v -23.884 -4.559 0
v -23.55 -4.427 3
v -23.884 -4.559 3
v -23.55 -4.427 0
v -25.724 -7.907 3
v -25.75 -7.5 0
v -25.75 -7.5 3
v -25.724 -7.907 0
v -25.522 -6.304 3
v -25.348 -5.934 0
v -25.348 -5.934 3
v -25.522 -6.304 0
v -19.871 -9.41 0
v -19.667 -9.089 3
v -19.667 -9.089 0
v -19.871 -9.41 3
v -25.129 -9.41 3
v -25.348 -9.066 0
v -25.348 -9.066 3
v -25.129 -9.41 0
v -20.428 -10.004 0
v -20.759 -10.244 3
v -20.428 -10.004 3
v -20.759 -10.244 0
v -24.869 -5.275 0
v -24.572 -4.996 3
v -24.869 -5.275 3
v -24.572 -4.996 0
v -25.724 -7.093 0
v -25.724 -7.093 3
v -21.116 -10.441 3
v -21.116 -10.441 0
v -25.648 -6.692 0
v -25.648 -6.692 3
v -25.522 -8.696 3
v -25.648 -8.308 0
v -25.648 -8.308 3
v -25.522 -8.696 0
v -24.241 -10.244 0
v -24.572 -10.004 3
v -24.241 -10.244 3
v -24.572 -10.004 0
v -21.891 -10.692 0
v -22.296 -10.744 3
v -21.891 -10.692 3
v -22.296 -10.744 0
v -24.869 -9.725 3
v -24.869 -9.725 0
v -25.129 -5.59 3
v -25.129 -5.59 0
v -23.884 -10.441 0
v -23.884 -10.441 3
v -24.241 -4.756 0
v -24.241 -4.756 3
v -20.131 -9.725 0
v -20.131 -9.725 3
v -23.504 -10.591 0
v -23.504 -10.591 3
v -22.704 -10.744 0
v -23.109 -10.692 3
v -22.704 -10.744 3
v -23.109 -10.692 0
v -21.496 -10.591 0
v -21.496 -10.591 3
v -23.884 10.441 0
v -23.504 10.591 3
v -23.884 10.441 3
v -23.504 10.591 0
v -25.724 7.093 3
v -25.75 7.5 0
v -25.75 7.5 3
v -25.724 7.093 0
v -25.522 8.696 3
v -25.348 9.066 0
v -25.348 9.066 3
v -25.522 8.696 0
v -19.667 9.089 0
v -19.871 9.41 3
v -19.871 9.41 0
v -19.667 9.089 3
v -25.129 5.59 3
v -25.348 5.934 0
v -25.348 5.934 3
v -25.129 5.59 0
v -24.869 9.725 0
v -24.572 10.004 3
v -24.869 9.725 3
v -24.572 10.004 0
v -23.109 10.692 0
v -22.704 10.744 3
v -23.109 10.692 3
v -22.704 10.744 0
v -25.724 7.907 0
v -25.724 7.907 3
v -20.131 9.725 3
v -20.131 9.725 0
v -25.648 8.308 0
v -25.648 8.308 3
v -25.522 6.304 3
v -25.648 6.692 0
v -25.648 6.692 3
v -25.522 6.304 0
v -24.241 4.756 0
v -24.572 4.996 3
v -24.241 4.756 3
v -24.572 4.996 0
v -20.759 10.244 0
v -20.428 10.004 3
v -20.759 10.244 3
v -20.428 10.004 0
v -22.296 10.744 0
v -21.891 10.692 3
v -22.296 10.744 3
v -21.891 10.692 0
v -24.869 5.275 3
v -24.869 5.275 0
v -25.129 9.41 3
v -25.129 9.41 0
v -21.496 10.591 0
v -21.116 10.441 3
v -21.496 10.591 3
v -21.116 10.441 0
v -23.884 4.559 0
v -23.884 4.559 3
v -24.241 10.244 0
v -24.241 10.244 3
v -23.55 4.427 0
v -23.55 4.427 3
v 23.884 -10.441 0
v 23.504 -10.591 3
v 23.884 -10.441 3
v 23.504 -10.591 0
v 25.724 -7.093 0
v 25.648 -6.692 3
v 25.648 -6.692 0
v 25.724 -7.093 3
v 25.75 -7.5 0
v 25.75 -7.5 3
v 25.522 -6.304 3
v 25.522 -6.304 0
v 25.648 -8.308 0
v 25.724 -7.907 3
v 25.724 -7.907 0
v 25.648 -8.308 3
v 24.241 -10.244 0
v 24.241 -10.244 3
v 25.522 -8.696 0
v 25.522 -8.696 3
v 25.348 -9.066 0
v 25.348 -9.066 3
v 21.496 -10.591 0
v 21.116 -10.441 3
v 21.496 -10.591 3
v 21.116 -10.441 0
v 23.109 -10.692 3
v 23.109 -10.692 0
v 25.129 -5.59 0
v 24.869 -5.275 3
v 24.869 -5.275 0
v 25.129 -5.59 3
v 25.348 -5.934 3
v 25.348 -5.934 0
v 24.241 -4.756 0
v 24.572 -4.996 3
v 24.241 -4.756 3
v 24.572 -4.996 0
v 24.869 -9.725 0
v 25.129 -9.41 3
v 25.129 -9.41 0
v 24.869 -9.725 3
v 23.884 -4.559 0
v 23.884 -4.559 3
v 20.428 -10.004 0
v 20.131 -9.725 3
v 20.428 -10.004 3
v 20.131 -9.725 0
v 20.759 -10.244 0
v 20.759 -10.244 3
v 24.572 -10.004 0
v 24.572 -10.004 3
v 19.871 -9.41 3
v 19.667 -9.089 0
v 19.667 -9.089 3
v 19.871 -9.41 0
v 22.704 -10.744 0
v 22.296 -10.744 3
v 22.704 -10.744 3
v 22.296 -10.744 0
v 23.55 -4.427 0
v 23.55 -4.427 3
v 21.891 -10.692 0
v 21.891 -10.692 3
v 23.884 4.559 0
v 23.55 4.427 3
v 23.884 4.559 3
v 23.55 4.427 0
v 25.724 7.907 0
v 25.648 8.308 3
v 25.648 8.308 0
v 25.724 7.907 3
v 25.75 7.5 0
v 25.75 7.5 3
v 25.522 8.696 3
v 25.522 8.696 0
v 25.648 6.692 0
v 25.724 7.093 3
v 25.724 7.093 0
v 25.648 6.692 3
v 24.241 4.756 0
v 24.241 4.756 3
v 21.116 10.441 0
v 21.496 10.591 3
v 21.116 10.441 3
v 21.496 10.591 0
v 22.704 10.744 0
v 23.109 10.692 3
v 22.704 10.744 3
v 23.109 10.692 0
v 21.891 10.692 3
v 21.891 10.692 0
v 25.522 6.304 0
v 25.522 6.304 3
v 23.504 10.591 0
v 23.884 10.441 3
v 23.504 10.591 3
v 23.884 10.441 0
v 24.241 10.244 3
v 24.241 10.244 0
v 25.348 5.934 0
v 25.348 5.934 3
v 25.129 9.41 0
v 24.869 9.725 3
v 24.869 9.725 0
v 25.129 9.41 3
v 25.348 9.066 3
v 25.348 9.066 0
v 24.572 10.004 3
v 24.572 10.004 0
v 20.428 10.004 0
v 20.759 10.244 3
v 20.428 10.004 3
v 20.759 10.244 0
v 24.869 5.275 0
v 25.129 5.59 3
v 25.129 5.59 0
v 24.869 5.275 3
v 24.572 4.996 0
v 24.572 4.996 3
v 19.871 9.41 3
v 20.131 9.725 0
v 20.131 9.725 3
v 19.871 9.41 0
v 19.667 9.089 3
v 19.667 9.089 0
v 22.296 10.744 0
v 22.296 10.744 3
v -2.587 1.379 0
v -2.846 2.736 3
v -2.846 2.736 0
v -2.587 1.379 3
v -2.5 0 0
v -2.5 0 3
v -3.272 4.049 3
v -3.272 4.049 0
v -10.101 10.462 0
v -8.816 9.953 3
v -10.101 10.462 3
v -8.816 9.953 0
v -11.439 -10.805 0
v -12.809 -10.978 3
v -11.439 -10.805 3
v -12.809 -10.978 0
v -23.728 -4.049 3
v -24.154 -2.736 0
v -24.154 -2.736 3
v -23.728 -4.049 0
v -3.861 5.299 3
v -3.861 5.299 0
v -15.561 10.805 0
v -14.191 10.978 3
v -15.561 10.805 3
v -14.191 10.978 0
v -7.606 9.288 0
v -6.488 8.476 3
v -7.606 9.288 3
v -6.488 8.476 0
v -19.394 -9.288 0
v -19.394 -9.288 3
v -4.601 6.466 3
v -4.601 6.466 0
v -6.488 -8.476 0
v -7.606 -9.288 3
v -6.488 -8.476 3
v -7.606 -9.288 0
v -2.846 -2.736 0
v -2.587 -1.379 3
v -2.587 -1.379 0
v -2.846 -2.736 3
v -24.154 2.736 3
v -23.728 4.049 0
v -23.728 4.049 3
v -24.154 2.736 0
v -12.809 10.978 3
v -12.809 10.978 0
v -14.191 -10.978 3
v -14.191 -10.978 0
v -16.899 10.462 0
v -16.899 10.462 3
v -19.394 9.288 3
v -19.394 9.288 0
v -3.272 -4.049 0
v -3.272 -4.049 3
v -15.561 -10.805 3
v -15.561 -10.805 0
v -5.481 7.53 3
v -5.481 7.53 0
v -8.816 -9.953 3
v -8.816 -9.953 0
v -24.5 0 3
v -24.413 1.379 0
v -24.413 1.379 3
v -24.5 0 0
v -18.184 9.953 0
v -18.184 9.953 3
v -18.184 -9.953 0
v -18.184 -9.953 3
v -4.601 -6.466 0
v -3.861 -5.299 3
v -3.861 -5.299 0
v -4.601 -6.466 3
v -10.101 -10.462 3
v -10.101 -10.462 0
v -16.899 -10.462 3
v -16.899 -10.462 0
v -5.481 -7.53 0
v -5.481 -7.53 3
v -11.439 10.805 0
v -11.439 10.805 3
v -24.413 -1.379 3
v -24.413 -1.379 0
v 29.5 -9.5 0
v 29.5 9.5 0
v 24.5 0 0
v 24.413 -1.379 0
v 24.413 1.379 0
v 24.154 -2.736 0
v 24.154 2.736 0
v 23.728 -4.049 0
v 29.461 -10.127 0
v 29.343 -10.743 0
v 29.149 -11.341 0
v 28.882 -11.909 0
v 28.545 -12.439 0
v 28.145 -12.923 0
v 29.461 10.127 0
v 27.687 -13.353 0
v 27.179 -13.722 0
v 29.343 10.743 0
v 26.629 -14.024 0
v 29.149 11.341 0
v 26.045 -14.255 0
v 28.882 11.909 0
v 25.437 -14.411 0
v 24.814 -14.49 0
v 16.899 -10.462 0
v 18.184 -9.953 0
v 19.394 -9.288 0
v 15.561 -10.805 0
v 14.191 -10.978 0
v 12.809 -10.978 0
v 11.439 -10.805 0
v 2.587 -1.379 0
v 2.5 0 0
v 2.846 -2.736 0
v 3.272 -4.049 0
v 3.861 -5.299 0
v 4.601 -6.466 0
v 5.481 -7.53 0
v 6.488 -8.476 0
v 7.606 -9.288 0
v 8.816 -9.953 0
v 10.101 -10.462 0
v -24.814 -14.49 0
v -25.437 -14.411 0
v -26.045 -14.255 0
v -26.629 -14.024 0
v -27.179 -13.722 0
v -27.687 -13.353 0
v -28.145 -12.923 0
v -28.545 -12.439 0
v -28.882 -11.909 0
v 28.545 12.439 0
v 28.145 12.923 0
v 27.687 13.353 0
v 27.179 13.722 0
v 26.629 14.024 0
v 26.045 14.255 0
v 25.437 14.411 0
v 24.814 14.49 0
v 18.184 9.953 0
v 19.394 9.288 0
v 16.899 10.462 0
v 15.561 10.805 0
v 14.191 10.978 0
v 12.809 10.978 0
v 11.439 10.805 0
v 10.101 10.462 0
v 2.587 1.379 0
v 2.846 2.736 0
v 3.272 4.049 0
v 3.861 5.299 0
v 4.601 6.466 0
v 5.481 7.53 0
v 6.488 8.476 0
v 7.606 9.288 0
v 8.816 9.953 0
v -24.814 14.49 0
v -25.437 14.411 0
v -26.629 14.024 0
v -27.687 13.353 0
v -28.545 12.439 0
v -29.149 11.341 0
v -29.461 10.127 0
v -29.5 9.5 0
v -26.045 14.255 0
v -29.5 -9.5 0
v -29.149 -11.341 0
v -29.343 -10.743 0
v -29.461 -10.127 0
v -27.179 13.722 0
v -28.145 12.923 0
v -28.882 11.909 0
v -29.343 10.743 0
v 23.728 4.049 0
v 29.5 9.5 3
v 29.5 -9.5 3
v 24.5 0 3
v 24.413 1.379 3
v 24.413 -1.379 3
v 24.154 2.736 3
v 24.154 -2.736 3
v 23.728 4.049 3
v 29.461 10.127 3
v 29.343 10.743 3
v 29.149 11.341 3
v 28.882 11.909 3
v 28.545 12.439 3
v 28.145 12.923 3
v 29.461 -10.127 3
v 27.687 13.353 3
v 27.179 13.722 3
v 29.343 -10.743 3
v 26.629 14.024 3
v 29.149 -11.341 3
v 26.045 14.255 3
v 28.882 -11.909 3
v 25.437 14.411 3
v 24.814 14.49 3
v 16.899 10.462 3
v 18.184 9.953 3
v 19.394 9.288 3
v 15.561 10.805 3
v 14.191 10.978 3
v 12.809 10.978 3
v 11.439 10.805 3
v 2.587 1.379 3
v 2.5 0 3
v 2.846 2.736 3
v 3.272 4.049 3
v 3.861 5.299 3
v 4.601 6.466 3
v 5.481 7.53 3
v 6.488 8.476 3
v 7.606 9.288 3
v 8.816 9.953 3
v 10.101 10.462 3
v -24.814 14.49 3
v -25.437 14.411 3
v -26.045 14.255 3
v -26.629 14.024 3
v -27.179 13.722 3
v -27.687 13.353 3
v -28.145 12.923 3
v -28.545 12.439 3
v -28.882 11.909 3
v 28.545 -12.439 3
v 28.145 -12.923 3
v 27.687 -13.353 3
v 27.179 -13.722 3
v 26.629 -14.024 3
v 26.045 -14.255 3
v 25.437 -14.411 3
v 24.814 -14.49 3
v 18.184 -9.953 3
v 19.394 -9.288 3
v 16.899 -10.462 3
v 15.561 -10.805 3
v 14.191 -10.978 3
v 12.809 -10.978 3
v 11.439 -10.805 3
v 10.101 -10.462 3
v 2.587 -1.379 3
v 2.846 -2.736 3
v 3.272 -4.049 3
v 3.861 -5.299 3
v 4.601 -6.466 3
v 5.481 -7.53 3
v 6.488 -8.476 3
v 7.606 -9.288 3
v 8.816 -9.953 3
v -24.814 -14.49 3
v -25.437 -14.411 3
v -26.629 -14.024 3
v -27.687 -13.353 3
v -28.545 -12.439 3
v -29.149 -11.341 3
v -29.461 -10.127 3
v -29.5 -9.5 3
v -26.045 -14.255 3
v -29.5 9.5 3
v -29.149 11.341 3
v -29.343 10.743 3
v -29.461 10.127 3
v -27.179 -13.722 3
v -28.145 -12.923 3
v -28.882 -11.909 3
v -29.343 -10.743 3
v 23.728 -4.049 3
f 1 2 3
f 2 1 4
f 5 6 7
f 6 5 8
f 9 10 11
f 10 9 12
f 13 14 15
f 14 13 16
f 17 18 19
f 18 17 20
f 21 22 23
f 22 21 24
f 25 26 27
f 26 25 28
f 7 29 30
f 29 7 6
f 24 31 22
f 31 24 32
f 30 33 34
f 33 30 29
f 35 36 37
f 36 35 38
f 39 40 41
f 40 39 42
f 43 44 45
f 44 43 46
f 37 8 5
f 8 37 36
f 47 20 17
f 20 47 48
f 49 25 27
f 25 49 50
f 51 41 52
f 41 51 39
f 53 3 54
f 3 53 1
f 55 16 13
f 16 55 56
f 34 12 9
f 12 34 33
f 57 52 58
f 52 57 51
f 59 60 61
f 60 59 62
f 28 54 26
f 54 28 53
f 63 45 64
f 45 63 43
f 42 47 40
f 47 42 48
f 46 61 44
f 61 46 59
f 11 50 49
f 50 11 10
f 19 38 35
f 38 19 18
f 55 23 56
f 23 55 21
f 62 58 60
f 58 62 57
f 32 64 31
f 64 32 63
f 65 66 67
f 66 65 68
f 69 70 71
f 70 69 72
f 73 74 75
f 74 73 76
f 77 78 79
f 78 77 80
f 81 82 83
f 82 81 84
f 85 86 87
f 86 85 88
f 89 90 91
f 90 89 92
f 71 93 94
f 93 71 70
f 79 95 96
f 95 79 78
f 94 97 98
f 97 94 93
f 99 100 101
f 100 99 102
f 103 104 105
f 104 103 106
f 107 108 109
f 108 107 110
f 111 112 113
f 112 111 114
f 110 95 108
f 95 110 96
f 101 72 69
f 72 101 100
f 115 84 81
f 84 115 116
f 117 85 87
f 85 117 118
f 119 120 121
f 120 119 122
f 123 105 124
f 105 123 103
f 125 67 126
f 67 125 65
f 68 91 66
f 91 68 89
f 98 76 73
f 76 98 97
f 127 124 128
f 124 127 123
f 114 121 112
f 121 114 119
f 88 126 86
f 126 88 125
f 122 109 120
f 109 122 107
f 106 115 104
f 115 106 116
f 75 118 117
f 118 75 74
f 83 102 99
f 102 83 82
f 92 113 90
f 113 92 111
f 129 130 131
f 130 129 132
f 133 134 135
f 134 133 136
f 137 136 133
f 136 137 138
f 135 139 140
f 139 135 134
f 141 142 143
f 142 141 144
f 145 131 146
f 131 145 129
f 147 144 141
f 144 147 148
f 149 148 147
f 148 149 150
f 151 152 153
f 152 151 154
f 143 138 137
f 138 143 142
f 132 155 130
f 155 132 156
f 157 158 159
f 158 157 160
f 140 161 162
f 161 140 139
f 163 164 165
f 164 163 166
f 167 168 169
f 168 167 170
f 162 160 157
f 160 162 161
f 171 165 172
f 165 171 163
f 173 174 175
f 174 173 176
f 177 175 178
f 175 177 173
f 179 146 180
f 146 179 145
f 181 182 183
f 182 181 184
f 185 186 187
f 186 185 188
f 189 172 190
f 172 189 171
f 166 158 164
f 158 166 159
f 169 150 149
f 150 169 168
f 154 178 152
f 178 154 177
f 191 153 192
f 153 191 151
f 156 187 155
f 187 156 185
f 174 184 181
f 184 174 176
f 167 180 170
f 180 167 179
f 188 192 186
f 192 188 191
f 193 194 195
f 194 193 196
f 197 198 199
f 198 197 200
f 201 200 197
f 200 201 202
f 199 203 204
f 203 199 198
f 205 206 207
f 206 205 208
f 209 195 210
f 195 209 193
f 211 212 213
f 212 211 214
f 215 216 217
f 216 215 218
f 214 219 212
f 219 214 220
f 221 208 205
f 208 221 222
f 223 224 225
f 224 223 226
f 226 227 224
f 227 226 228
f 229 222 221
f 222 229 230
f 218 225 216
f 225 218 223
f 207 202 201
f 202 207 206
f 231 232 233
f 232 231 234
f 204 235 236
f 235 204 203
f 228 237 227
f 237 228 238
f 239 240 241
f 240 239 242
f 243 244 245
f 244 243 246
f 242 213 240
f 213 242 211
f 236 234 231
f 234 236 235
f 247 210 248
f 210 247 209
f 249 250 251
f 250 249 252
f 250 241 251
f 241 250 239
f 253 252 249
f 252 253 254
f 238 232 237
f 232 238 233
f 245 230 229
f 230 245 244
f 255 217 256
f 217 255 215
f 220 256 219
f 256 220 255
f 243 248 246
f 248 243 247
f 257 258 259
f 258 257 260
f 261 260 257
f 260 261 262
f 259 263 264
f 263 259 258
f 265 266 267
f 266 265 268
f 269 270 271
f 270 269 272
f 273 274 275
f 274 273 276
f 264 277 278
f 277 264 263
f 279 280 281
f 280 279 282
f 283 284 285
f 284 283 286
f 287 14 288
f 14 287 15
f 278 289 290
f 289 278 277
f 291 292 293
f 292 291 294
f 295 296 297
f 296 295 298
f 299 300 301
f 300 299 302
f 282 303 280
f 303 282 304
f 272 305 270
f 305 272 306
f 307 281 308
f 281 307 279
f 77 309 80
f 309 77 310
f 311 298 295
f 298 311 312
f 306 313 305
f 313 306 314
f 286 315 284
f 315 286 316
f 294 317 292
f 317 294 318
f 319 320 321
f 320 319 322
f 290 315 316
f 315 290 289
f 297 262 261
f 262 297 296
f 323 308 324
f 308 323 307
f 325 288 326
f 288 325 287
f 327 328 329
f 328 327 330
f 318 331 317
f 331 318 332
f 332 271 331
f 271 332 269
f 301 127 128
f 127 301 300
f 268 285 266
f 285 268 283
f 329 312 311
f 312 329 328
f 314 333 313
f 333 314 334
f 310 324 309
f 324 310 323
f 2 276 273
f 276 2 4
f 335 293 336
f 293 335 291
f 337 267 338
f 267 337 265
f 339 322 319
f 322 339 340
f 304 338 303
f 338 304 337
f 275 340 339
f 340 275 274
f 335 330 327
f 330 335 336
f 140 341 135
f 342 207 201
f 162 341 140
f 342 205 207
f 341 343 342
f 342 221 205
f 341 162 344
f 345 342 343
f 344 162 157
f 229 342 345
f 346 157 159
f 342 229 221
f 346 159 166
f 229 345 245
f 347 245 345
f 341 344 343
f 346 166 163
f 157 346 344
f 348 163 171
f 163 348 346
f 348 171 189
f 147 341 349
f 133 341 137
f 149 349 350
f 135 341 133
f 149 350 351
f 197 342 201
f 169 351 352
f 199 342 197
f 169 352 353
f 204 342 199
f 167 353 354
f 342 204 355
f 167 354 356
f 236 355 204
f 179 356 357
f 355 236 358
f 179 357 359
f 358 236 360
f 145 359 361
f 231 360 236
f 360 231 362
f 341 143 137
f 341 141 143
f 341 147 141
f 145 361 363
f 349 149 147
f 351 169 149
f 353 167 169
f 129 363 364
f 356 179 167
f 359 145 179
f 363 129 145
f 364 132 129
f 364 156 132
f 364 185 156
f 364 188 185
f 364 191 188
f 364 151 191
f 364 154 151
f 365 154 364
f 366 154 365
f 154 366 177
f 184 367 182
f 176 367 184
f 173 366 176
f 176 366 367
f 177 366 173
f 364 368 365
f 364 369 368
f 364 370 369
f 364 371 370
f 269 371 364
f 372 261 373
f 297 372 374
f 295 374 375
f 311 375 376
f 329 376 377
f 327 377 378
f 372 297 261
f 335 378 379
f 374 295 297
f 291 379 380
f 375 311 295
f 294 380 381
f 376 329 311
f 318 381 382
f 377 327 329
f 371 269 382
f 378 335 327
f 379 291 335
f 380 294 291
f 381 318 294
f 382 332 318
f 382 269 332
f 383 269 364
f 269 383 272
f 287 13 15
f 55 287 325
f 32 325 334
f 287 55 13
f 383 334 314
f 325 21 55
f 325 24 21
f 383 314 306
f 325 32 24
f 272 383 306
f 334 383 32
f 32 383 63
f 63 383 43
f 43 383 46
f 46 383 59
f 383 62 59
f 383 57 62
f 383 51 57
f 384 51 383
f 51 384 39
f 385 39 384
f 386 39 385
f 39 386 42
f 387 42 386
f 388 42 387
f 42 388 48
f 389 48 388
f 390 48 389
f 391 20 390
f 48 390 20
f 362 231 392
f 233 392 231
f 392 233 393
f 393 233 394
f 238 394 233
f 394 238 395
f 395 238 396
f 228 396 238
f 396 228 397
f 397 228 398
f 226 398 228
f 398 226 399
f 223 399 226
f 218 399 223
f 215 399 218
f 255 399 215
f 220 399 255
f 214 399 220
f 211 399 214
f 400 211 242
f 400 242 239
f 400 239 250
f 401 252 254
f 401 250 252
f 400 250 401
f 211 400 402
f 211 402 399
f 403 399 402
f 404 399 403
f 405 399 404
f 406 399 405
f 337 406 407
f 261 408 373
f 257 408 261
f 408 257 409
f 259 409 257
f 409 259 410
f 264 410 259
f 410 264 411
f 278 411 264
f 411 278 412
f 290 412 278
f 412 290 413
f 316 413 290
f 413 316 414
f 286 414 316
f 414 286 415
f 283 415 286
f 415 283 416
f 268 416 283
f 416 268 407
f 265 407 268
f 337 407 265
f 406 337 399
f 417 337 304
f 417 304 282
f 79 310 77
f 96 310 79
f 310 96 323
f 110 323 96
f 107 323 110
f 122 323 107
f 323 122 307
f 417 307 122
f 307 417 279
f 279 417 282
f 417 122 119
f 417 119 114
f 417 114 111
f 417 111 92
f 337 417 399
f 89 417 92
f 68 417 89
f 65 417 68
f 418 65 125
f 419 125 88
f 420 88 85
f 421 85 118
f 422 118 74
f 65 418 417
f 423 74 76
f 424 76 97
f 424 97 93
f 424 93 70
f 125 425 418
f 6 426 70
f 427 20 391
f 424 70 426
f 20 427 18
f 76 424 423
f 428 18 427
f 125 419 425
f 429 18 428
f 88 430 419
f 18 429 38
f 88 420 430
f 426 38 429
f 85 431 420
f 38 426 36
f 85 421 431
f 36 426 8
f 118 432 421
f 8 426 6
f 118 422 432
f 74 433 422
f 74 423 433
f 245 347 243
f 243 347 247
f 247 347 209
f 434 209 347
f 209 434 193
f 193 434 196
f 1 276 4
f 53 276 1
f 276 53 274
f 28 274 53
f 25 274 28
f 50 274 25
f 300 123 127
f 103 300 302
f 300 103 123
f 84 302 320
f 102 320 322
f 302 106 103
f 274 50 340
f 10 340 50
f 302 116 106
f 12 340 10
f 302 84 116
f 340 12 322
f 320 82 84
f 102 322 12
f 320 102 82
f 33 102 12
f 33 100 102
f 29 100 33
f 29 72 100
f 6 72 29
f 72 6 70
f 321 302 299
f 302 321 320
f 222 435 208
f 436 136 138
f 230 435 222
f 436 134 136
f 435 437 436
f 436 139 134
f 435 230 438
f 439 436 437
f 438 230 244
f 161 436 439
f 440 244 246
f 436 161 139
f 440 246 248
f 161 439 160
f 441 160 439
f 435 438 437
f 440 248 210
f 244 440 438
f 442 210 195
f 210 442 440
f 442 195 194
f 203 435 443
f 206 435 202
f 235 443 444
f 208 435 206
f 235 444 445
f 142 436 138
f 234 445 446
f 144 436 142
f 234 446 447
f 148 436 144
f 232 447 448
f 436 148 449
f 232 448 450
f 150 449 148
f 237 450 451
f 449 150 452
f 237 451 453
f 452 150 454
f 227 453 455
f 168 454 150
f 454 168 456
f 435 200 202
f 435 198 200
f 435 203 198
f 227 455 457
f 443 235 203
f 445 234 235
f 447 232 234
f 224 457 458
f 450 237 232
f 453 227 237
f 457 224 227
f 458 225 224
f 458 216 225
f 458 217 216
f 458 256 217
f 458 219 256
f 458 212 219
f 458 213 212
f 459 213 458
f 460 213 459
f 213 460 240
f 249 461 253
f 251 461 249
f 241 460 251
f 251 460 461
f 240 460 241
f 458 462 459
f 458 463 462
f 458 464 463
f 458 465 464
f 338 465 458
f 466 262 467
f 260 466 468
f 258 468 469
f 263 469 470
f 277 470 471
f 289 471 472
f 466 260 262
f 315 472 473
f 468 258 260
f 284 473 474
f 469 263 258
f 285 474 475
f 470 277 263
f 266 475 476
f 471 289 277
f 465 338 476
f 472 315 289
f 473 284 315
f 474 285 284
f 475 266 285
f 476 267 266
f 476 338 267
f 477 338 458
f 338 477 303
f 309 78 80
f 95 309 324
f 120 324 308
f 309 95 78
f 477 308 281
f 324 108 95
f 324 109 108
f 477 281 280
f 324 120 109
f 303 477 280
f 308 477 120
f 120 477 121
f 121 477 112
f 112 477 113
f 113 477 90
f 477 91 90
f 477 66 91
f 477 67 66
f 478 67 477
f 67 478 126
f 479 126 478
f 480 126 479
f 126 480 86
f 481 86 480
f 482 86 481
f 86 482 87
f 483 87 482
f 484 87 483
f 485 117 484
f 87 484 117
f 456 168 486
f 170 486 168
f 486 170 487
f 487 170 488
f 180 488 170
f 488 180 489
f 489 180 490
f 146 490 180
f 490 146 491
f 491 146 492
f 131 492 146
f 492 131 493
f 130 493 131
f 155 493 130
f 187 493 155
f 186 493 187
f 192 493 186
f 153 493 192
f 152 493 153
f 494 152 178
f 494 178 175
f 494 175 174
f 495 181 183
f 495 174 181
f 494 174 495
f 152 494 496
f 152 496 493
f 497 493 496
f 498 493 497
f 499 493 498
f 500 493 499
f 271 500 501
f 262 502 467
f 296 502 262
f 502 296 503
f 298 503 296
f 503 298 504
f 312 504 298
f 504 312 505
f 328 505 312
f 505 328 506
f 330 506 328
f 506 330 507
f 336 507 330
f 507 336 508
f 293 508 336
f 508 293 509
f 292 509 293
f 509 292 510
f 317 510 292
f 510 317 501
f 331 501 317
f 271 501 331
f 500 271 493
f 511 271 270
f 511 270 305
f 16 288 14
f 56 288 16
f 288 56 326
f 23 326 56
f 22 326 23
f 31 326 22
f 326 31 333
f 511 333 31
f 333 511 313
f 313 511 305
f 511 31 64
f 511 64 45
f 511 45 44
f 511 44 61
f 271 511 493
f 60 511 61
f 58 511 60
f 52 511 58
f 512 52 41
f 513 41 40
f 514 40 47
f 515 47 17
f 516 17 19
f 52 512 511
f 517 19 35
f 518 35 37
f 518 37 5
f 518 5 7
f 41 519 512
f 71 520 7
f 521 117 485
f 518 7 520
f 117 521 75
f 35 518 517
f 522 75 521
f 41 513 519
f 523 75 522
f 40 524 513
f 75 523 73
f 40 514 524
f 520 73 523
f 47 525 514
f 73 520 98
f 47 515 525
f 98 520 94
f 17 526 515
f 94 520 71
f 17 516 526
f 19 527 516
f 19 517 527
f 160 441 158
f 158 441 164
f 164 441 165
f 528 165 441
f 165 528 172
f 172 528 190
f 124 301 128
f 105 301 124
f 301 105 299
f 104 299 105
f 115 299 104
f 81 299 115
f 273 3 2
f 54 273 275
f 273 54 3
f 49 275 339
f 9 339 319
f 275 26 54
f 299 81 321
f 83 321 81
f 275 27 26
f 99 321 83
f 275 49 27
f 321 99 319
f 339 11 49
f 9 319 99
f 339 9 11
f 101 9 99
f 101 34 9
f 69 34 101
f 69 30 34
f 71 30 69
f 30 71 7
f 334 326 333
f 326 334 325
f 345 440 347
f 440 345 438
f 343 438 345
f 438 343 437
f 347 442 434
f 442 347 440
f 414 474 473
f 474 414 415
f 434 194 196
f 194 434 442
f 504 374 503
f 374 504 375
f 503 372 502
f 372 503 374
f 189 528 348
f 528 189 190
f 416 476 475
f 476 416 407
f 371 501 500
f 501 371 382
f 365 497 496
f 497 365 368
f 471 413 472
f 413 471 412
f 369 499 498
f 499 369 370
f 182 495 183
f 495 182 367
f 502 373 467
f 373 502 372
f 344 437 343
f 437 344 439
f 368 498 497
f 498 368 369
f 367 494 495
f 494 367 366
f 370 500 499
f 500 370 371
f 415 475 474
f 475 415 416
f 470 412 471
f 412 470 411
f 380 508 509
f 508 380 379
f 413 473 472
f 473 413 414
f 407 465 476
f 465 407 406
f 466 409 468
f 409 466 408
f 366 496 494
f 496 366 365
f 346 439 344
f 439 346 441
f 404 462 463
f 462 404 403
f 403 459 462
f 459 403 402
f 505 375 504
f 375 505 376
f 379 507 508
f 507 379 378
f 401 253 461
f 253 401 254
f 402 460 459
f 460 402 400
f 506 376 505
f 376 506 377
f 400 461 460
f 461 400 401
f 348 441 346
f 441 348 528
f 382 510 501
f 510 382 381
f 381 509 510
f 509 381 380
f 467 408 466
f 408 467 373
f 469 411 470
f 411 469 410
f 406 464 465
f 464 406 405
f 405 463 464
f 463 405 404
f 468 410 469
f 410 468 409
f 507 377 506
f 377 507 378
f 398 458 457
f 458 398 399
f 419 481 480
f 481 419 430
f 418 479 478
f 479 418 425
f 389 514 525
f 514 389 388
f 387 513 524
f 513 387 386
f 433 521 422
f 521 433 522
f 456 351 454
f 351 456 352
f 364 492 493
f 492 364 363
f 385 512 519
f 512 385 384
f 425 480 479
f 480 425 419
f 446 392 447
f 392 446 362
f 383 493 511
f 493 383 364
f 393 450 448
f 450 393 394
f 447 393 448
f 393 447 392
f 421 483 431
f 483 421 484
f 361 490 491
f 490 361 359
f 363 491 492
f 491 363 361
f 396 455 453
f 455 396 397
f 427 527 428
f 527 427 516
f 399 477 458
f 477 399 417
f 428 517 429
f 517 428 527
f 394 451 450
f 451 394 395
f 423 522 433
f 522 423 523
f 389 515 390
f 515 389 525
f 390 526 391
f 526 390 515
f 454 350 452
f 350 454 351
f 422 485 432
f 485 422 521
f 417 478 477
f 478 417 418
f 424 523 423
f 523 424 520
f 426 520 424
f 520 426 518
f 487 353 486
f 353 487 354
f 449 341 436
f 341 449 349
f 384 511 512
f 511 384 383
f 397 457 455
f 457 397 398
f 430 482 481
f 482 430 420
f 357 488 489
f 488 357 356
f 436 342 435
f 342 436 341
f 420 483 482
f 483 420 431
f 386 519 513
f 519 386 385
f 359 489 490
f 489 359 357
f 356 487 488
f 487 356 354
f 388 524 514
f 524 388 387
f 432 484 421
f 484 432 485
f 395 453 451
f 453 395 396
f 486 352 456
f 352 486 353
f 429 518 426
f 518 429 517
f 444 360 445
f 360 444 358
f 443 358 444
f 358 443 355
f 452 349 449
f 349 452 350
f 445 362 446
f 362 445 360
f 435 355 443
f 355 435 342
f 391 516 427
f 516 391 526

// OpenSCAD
$fn = 50;

difference() {
	union() {
		hull() {
			translate(v = [-24.5, 9.5, 0]) {
				cylinder(h = 3, r = 5);
			}
			translate(v = [24.5, 9.5, 0]) {
				cylinder(h = 3, r = 5);
			}
			translate(v = [-24.5, -9.5, 0]) {
				cylinder(h = 3, r = 5);
			}
			translate(v = [24.5, -9.5, 0]) {
				cylinder(h = 3, r = 5);
			}
		}
	}
	union() {
		translate(v = [-22.5, -7.5, -100.0]) {
			cylinder(h = 200, r = 3.25);
		}
		translate(v = [-22.5, 7.5, -100.0]) {
			cylinder(h = 200, r = 3.25);
		}
		translate(v = [22.5, -7.5, -100.0]) {
			cylinder(h = 200, r = 3.25);
		}
		translate(v = [22.5, 7.5, -100.0]) {
			cylinder(h = 200, r = 3.25);
		}
		translate(v = [-22.5, -7.5, -100.0]) {
			cylinder(h = 200, r = 1.8);
		}
		translate(v = [-22.5, 7.5, -100.0]) {
			cylinder(h = 200, r = 1.8);
		}
		translate(v = [22.5, -7.5, -100.0]) {
			cylinder(h = 200, r = 1.8);
		}
		translate(v = [22.5, 7.5, -100.0]) {
			cylinder(h = 200, r = 1.8);
		}
		translate(v = [-13.5, 0, 0.0]) {
			cylinder(h = 3, r = 11.0);
		}
		translate(v = [13.5, 0, 0.0]) {
			cylinder(h = 3, r = 11.0);
		}
	}
}
